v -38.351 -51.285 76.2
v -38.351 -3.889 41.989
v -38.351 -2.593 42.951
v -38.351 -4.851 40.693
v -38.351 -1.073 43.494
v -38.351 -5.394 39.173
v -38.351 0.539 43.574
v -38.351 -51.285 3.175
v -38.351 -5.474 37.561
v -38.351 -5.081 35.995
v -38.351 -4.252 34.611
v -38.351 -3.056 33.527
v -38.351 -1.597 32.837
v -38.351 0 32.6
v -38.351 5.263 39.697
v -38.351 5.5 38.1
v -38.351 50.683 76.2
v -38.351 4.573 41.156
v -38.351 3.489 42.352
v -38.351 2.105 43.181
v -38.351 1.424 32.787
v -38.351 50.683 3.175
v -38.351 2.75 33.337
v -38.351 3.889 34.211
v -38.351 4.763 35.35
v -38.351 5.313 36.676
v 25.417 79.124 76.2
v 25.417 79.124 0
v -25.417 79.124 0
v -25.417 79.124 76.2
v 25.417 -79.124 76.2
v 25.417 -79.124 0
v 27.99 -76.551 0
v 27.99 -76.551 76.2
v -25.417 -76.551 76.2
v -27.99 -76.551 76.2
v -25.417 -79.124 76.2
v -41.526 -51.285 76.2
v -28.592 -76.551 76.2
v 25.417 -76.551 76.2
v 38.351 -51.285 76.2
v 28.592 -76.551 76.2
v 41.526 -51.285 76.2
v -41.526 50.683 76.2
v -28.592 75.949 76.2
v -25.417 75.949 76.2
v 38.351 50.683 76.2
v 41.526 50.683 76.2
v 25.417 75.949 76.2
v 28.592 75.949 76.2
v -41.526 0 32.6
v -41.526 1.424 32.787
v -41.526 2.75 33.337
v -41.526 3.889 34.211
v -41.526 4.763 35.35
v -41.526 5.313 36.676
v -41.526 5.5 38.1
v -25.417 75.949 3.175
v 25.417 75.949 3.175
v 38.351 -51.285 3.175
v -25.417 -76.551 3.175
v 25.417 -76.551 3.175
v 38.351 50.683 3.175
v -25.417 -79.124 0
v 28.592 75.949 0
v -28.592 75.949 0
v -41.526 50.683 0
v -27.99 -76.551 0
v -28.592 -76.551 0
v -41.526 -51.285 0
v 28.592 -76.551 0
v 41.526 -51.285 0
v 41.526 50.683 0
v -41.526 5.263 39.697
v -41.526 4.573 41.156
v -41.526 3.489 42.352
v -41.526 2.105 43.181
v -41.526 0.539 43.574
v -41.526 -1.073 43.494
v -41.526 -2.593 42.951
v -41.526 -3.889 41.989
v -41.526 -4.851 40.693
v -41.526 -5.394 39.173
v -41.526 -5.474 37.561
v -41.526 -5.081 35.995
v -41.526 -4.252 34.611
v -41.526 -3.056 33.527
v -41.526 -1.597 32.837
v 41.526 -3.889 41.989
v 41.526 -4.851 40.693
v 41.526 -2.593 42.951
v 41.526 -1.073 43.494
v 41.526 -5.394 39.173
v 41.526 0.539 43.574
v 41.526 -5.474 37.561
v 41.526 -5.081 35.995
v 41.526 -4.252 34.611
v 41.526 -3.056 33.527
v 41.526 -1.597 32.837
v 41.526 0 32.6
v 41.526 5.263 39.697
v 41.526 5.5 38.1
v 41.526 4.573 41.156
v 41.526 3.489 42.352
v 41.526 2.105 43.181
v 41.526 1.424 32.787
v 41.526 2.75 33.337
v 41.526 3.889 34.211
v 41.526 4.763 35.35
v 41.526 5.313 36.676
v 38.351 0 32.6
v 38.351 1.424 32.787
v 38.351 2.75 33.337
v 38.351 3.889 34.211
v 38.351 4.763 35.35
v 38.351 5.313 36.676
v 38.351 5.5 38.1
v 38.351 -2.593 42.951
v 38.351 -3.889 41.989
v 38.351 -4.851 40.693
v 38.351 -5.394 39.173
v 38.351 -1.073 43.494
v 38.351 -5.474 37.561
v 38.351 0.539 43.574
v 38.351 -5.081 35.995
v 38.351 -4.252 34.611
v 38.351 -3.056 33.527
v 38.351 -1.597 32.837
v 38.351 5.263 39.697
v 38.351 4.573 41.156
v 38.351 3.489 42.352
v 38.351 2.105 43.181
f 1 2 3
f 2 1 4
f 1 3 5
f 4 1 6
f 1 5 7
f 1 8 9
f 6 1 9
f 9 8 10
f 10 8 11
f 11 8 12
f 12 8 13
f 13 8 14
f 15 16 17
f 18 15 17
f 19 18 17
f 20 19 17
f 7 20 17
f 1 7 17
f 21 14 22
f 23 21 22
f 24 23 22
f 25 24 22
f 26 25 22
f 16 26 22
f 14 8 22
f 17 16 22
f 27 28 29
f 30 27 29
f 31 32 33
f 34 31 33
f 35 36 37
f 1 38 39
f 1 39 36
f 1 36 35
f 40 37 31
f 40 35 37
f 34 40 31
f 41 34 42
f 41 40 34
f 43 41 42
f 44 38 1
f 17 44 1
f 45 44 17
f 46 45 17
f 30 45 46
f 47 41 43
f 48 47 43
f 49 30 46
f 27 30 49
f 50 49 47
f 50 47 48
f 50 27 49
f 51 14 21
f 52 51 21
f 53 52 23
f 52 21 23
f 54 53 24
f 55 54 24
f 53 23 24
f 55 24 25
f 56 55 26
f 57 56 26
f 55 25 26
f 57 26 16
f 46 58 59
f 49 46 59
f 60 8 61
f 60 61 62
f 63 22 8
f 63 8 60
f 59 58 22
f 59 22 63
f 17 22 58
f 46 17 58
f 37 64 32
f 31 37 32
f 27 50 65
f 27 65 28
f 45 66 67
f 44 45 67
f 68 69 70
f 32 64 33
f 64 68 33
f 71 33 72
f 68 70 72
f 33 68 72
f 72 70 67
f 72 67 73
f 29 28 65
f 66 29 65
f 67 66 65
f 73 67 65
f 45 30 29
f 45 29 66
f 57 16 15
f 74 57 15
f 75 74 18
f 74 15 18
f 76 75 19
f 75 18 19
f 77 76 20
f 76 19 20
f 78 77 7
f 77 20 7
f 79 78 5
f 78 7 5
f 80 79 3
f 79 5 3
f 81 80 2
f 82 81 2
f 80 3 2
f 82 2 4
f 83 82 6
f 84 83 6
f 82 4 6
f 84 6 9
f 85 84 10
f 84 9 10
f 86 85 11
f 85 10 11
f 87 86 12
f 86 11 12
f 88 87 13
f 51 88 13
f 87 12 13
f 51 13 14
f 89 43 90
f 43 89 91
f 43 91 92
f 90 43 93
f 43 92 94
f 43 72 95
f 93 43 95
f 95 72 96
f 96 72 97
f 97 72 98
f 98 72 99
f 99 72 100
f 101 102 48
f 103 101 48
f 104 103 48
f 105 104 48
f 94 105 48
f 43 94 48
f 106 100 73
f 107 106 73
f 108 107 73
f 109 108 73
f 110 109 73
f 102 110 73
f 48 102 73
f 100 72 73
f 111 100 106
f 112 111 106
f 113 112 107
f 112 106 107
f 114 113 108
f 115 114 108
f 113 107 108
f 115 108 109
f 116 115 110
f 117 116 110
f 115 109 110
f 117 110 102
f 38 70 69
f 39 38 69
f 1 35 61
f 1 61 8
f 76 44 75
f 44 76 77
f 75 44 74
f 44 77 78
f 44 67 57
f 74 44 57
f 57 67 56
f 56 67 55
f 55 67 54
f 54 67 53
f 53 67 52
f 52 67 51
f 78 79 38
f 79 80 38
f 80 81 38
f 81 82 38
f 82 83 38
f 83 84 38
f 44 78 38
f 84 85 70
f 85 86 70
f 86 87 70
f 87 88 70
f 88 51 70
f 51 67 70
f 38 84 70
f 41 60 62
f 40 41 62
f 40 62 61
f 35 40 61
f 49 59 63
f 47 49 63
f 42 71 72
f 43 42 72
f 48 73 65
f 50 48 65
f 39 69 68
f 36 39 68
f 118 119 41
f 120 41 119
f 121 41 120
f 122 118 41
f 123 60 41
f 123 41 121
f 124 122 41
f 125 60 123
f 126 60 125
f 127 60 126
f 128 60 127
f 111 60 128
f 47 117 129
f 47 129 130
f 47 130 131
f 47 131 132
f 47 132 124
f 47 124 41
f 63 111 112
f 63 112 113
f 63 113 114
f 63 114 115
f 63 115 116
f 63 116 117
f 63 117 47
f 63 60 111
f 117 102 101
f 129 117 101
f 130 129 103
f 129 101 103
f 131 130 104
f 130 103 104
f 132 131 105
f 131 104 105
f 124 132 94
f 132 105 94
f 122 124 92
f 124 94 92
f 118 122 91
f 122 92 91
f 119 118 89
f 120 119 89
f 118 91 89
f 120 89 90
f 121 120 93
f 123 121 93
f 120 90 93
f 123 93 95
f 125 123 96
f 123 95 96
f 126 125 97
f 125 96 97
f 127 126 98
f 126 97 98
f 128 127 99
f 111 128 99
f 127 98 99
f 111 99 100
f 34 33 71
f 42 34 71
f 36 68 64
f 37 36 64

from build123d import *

# Parameters (mm, degrees)
F1_DEPTH = 3.175
F0_W     = 3.175
F0_H     = 101.9676364958
F2_DEPTH = 76.2
F4_DEPTH = 106.68


with BuildPart() as f1:
    # F0 (on Top) → F1 (new body)
    with BuildSketch(Plane.XY):
        Polygon((25.4167113453, 75.9493410587), (0, 75.9493410587), (-25.4167113453, 75.9493410587), (-38.3506603539, 50.683028996), (-38.3506603539, -51.2846074998), (-25.4167113453, -76.5509232879), (0, -76.5509232879), (25.4167113453, -76.5509232879), (38.3506603539, -51.2846074998), (38.3506603539, 50.683028996), align=None)
    extrude(amount=F1_DEPTH)

    # F0 (on Top) → F2 (join)
    with BuildSketch(Plane.XY):
        Polygon((-25.4167113453, 75.9493410587), (0, 75.9493410587), (25.4167113453, 75.9493410587), (25.4167113453, 79.1243410587), (-25.4167113453, 79.1243410587), align=None)
        Polygon((-38.3506603539, 50.683028996), (-25.4167113453, 75.9493410587), (-28.5917113453, 75.9493410587), (-41.5256603539, 50.683028996), (-41.5256603539, -51.2846074998), (-28.5917113453, -76.5509232879), (-27.9901291162, -76.5509232879), (-25.4167113453, -76.5509232879), (-38.3506603539, -51.2846074998), align=None)
        Polygon((-28.5917113453, 75.9493410587), (-25.4167113453, 75.9493410587), (-25.4167113453, 79.1243410587), align=None)
        Polygon((28.5917113453, 75.9493410587), (25.4167113453, 75.9493410587), (38.3506603539, 50.683028996), (41.5256603539, 50.683028996), align=None)
        Polygon((25.4167113453, 79.1243410587), (25.4167113453, 75.9493410587), (28.5917113453, 75.9493410587), align=None)
        with Locations((39.9381603539, -0.3007892519)):
            Rectangle(F0_W, F0_H)
        Polygon((41.5256603539, -51.2846074998), (38.3506603539, -51.2846074998), (25.4167113453, -76.5509232879), (27.9901291162, -76.5509232879), (28.5917113453, -76.5509232879), align=None)
        Polygon((-25.4167113453, -79.1243410587), (-25.4167113453, -76.5509232879), (-27.9901291162, -76.5509232879), align=None)
        Polygon((0, -76.5509232879), (-25.4167113453, -76.5509232879), (-25.4167113453, -79.1243410587), (25.4167113453, -79.1243410587), (25.4167113453, -76.5509232879), align=None)
        Polygon((27.9901291162, -76.5509232879), (25.4167113453, -76.5509232879), (25.4167113453, -79.1243410587), align=None)
    extrude(amount=F2_DEPTH)

    # F3 (on face) → F4 (cut)
    with BuildSketch(Plane.YZ.offset(41.5256603539)):
        with BuildLine():
            ThreePointArc((5.5000017, 38.1), (-3.8890884986, 41.9890884986), (0, 32.5999983))
            ThreePointArc((0, 32.5999983), (3.8890884986, 34.2109115014), (5.5000017, 38.1))
        make_face()
    extrude(amount=-F4_DEPTH, mode=Mode.SUBTRACT)


solid = f1.part
